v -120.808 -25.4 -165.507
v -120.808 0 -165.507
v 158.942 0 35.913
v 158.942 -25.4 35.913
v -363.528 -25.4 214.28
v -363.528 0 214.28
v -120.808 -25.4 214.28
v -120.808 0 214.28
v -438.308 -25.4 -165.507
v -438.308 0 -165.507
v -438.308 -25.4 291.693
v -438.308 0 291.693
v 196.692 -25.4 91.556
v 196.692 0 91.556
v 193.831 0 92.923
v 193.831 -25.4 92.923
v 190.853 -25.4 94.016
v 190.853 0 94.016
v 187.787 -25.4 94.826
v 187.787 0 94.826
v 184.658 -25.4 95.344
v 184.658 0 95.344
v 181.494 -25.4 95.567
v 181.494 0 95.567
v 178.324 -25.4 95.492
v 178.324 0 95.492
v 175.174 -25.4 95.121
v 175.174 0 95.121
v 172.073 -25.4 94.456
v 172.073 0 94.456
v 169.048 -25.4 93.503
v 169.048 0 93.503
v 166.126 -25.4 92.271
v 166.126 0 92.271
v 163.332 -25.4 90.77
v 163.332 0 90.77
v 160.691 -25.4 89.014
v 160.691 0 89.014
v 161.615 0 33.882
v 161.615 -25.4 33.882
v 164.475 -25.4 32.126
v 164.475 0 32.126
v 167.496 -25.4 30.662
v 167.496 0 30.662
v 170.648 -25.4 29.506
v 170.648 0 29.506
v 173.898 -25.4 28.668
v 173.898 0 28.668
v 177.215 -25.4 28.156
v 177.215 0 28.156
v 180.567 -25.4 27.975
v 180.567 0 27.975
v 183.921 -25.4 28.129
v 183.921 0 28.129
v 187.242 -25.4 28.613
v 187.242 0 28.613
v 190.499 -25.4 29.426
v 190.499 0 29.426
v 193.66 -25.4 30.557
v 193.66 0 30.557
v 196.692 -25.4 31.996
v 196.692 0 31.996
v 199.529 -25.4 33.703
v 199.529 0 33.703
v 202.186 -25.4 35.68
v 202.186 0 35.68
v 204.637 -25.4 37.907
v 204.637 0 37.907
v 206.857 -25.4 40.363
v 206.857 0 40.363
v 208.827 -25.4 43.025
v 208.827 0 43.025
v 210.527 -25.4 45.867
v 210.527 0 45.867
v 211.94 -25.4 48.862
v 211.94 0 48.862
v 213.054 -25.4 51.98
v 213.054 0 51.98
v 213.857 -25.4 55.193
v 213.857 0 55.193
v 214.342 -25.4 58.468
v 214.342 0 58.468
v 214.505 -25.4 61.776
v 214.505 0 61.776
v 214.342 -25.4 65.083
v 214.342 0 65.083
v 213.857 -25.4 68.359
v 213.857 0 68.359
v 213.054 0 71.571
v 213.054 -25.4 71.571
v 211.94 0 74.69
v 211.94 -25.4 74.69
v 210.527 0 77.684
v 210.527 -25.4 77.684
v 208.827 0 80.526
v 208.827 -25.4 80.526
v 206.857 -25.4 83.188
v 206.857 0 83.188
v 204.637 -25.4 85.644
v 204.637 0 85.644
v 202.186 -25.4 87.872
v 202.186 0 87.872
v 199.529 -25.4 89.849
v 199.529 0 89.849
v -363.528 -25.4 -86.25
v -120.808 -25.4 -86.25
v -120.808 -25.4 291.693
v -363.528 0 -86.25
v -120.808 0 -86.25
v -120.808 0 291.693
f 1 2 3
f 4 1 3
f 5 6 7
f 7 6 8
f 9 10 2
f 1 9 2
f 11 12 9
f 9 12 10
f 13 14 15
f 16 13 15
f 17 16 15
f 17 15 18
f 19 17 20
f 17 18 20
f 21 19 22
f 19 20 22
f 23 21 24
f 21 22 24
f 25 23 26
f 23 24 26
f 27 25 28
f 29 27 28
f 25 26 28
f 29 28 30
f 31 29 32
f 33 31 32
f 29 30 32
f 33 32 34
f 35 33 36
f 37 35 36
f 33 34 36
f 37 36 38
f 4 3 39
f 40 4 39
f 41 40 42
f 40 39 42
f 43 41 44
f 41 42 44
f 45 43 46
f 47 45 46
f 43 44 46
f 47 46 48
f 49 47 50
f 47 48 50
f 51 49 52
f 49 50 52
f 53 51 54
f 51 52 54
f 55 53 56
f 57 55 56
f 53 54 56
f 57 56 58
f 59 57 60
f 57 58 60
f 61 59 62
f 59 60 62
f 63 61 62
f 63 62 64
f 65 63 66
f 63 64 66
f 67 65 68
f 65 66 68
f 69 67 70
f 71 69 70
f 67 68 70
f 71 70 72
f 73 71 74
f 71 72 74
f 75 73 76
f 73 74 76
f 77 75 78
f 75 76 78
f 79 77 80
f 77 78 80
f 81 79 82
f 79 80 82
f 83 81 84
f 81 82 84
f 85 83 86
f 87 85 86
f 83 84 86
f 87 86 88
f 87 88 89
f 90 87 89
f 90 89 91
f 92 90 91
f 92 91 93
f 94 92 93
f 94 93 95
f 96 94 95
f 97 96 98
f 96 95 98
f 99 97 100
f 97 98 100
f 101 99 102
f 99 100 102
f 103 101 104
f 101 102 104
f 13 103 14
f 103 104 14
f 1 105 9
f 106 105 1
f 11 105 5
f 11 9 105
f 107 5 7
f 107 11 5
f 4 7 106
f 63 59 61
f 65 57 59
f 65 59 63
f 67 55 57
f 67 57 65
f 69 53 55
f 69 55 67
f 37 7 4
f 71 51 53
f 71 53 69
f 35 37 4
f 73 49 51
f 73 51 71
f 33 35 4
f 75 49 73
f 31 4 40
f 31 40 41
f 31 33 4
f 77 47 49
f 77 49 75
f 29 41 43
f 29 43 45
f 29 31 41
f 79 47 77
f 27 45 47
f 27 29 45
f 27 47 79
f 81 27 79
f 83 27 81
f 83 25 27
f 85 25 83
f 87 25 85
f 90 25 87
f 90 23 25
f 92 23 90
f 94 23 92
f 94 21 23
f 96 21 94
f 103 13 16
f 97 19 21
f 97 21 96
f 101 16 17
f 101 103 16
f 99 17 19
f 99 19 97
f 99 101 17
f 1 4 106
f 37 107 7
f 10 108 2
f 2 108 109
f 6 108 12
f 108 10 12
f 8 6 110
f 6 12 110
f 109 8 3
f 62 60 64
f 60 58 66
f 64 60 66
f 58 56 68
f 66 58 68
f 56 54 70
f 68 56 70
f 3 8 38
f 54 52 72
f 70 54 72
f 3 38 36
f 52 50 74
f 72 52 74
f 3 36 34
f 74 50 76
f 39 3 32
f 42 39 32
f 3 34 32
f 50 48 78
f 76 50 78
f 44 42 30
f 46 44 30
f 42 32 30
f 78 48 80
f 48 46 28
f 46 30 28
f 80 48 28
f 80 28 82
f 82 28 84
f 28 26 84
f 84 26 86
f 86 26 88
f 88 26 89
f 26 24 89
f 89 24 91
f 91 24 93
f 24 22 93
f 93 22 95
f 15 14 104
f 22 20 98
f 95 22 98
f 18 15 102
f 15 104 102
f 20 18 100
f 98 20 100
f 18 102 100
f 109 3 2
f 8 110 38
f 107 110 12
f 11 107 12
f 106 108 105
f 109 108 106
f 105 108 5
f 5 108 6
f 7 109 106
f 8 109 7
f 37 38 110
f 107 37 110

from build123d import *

# Parameters (mm, degrees)
F0_W     = 242.720081
F0_H     = 300.530582
F1_DEPTH = 25.4


with BuildPart() as f1:
    # F0 (on Front) → F1 (new body)
    with BuildSketch(Plane.XZ):
        Polygon((-120.807813, 291.692996), (-438.307813, 291.692996), (-438.307813, -165.507004), (-120.807813, -165.507004), (158.94197, 35.91284), (196.692187, 63.092996), (160.690517, 89.014198), align=None)
        with Locations((-242.167854, 64.014867)):
            Rectangle(F0_W, F0_H, mode=Mode.SUBTRACT)
        with BuildLine():
            ThreePointArc((196.692187, 91.555874), (178.323721, 95.492349), (160.690517, 89.014198))
            Line((160.690517, 89.014198), (196.692187, 63.092996))
            Line((196.692187, 63.092996), (196.692187, 91.555874))
        make_face()
        with BuildLine():
            Line((196.692187, 91.555874), (196.692187, 63.092996))
            Line((196.692187, 63.092996), (196.692187, 31.995555))
            ThreePointArc((196.692187, 31.995555), (214.504632, 61.775715), (196.692187, 91.555874))
        make_face()
        with BuildLine():
            Line((196.692187, 31.995555), (196.692187, 63.092996))
            Line((196.692187, 63.092996), (158.94197, 35.91284))
            ThreePointArc((158.94197, 35.91284), (177.215375, 28.155683), (196.692187, 31.995555))
        make_face()
    extrude(amount=F1_DEPTH)


solid = f1.part
